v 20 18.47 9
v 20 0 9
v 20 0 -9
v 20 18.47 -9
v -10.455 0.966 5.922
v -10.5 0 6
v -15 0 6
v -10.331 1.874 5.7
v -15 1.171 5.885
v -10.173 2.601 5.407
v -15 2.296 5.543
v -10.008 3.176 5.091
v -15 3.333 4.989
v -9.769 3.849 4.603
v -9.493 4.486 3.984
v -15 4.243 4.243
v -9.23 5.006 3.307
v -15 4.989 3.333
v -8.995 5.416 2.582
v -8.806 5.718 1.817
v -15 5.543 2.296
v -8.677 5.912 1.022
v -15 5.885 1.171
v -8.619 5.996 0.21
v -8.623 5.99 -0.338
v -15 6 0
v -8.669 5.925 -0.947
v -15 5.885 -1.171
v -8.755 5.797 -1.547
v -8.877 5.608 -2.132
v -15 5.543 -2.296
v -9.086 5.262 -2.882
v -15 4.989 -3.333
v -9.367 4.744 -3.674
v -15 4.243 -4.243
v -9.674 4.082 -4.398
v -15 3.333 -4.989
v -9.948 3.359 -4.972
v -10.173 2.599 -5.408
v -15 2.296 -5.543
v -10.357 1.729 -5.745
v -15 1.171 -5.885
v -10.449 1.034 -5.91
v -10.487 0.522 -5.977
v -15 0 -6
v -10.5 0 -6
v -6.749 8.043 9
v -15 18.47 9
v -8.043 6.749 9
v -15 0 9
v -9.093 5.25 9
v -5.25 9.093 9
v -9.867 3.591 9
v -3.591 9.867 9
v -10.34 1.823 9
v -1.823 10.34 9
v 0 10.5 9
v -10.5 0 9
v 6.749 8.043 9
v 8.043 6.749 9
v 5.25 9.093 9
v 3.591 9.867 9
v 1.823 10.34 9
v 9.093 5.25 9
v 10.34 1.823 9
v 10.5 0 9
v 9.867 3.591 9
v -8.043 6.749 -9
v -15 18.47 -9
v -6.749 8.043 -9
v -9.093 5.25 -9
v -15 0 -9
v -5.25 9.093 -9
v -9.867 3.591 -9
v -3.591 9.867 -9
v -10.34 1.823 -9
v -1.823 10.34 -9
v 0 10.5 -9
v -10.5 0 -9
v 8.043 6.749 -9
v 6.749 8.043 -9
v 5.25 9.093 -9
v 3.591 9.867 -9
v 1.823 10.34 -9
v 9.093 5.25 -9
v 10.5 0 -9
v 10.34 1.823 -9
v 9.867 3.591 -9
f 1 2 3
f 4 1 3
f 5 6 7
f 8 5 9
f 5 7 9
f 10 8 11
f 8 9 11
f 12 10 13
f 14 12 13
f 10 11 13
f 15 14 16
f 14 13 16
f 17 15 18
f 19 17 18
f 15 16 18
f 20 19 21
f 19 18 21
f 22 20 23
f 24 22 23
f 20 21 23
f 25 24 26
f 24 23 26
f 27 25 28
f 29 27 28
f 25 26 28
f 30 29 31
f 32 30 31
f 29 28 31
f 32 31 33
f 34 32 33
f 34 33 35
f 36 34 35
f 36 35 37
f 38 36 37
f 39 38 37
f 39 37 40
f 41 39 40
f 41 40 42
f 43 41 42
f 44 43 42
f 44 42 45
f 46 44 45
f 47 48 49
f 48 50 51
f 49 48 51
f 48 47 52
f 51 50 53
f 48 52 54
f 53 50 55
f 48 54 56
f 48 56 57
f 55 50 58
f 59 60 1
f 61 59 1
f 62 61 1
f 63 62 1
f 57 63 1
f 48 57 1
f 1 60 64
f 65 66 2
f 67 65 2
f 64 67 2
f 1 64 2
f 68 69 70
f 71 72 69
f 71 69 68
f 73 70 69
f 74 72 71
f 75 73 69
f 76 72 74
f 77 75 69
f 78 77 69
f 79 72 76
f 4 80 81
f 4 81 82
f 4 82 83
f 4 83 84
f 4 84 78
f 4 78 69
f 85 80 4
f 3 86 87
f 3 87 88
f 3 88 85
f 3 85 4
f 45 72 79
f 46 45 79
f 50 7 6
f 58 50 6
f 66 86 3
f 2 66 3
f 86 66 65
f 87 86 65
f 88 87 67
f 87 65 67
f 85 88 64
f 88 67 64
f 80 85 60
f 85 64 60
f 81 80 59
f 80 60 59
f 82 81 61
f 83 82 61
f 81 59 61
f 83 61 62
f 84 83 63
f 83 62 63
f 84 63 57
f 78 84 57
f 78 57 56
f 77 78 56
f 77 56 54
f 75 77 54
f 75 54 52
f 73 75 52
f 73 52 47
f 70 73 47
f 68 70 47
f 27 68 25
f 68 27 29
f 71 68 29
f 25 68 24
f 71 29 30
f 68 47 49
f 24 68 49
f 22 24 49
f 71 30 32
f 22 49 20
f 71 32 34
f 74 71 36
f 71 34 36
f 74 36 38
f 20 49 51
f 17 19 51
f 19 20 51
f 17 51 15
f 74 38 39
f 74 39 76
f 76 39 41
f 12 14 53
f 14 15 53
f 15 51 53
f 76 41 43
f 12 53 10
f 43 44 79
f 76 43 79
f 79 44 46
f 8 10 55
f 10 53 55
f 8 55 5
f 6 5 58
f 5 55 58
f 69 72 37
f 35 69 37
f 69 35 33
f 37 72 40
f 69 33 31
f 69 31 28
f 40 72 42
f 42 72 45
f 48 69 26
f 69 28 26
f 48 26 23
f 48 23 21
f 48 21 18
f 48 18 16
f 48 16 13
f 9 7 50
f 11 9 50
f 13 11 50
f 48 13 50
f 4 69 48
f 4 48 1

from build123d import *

# Parameters (mm, degrees)
SKETCH1_W           = 40
SKETCH1_H           = 18
BOSS_EXTRUDE1_DEPTH = 18.47
CUT_EXTRUDE1_REACH  = 20
SKETCH2_R           = 10.5
CUT_EXTRUDE3_REACH  = 42
SKETCH4_R           = 6
CUT_EXTRUDE4_REACH  = 20.47
SKETCH5_W           = 5
SKETCH5_H           = 18


with BuildPart() as part:
    # Sketch1 → Boss-Extrude1 (new body)
    with BuildSketch(Plane(origin=(0, 0, 0), x_dir=(1, 0, 0), z_dir=(0, 1, 0))):
        Rectangle(SKETCH1_W, SKETCH1_H)
    extrude(amount=BOSS_EXTRUDE1_DEPTH)

    # Sketch2 → Cut-Extrude1 (cut, up to next)
    with BuildSketch(Plane.XY.offset(9), mode=Mode.PRIVATE) as cut_extrude1_sk1:
        Circle(SKETCH2_R)
    cut_extrude1_tool1 = extrude(cut_extrude1_sk1.sketch, amount=-CUT_EXTRUDE1_REACH, mode=Mode.PRIVATE) & part.part
    add(cut_extrude1_tool1.solids().sort_by_distance((0, 0, 9))[0], mode=Mode.SUBTRACT)

    # Sketch4 → Cut-Extrude3 (cut, up to next)
    with BuildSketch(Plane.ZY.offset(20), mode=Mode.PRIVATE) as cut_extrude3_sk1:
        Circle(SKETCH4_R)
    cut_extrude3_tool1 = extrude(cut_extrude3_sk1.sketch, amount=-CUT_EXTRUDE3_REACH, mode=Mode.PRIVATE) & part.part
    add(cut_extrude3_tool1.solids().sort_by_distance((-20, 0, 0))[0], mode=Mode.SUBTRACT)

    # Sketch5 → Cut-Extrude4 (cut, up to next)
    with BuildSketch(Plane.XZ, mode=Mode.PRIVATE) as cut_extrude4_sk1:
        with Locations((-17.5, 0)):
            Rectangle(SKETCH5_W, SKETCH5_H)
    cut_extrude4_tool1 = extrude(cut_extrude4_sk1.sketch, amount=-CUT_EXTRUDE4_REACH, mode=Mode.PRIVATE) & part.part
    add(cut_extrude4_tool1.solids().sort_by_distance((-17.5, 0, 0))[0], mode=Mode.SUBTRACT)


solid = part.part
